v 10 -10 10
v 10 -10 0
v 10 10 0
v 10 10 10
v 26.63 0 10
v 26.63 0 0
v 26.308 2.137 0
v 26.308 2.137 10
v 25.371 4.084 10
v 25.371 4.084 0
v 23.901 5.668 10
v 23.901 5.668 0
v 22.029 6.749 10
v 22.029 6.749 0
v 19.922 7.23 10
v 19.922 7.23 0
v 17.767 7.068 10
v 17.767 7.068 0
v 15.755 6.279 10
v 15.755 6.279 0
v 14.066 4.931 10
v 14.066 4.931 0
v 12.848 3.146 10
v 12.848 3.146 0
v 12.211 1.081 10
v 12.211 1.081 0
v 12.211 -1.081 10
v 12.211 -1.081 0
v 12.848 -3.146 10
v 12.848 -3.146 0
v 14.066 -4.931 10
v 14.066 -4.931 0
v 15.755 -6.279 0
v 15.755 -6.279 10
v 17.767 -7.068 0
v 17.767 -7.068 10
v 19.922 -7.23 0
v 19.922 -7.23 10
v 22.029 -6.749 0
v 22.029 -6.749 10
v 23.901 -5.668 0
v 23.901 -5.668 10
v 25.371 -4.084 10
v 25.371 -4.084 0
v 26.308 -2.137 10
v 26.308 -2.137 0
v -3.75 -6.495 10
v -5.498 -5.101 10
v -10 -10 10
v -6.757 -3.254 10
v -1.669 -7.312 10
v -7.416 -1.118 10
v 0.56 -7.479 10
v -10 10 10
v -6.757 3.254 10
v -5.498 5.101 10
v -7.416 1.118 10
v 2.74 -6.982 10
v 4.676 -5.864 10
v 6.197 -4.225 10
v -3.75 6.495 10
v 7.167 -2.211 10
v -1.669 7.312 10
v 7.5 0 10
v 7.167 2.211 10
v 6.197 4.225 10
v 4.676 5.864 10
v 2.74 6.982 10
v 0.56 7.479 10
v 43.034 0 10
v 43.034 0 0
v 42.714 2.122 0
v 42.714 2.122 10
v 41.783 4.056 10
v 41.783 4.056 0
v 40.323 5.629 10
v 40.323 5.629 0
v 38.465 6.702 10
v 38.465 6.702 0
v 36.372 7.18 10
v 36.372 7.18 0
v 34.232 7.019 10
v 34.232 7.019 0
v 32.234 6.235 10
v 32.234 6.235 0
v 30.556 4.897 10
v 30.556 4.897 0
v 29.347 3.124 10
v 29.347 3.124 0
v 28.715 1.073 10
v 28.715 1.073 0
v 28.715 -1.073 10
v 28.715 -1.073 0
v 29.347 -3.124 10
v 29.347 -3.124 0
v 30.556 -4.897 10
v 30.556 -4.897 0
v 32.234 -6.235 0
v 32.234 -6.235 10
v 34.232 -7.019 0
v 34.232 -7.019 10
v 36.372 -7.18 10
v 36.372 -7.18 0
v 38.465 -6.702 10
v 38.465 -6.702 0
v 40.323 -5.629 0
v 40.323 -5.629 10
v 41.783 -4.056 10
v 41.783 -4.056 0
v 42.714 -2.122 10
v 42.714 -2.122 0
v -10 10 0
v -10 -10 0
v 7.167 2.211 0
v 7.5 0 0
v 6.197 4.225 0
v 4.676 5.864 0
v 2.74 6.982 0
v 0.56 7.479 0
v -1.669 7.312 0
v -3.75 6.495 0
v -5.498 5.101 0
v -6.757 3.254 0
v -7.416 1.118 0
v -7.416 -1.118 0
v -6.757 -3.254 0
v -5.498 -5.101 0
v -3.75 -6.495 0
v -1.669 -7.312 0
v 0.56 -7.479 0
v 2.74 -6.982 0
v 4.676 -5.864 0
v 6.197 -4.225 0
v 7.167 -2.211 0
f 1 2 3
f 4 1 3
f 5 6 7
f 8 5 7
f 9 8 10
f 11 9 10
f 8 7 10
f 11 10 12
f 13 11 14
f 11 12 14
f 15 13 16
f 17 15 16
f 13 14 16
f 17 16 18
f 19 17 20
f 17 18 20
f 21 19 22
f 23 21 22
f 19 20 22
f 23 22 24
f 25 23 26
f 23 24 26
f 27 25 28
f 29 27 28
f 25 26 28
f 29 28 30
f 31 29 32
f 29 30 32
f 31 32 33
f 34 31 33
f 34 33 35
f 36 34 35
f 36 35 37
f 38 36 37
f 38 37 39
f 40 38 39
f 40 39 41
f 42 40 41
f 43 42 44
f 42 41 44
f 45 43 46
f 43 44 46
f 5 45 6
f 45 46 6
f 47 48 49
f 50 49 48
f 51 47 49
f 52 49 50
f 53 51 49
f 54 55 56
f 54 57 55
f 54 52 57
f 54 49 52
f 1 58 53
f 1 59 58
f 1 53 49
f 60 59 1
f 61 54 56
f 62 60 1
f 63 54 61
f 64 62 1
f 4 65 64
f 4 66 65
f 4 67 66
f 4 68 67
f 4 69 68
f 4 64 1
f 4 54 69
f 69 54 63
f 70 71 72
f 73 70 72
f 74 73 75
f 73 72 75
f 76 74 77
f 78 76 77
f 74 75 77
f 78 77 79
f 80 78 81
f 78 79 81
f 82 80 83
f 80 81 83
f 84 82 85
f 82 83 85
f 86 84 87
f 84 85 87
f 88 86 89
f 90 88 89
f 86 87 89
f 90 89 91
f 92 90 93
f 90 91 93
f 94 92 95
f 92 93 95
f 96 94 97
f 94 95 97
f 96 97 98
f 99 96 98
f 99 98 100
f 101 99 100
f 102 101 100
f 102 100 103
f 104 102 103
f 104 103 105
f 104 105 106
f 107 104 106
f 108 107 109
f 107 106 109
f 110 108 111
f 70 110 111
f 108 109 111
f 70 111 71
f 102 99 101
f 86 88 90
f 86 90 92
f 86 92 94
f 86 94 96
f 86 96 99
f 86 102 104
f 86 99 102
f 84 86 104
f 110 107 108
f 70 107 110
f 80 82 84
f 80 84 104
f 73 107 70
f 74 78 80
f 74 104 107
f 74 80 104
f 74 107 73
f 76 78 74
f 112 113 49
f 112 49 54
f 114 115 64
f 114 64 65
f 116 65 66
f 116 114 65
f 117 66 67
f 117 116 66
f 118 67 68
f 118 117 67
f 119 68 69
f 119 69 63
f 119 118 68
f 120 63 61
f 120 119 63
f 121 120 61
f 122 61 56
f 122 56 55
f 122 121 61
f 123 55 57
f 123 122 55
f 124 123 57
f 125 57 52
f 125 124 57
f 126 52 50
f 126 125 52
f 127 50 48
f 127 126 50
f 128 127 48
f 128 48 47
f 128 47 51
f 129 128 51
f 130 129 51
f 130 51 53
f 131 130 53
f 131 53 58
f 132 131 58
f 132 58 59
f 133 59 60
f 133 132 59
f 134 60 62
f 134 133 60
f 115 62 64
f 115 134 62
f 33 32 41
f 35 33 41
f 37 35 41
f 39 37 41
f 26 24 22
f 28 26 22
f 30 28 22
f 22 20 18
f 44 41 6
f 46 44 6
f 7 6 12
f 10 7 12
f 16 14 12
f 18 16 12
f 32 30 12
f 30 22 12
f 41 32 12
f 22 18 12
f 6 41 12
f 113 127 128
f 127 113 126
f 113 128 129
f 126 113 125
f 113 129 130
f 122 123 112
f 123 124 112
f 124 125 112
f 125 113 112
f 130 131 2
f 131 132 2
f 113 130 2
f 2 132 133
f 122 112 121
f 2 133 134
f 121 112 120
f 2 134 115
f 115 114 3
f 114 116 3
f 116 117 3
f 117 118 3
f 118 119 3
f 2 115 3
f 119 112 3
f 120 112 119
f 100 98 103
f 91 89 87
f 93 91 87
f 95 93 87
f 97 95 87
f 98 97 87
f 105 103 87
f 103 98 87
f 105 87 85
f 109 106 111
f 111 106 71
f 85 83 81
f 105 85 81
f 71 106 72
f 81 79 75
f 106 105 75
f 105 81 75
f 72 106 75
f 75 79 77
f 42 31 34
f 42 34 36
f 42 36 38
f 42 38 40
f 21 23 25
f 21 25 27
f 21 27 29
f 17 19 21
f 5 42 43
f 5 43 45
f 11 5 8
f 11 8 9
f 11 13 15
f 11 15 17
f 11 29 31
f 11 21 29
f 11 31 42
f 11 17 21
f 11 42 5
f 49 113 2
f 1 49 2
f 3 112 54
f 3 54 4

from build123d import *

# Parameters (mm, degrees)
F0_W     = 20
F0_H     = 20
F0_R     = 7.5
F1_DEPTH = 10
F0_R_2   = 7.2
F0_R_3   = 7.25


# Not quite as in the source:
# - a feature names something its author has since deleted; it is built from what else it names


with BuildPart() as f1:
    # F0 (on Top) → F1 (new body)
    with BuildSketch(Plane.XY):
        Rectangle(F0_W, F0_H)
        Circle(F0_R, mode=Mode.SUBTRACT)
    extrude(amount=F1_DEPTH)


with BuildPart() as f1b:
    # F0 (on Top) → F1, piece 2 (new body)
    with BuildSketch(Plane.XY):
        with Locations((35.8341895044, 0)):
            Circle(F0_R_2)
    extrude(amount=F1_DEPTH)


with BuildPart() as f1c:
    # F0 (on Top) → F1, piece 3 (new body)
    with BuildSketch(Plane.XY):
        with Locations((19.3803589791, 0)):
            Circle(F0_R_3)
    extrude(amount=F1_DEPTH)


solid = Compound([f1.part, f1b.part, f1c.part])
